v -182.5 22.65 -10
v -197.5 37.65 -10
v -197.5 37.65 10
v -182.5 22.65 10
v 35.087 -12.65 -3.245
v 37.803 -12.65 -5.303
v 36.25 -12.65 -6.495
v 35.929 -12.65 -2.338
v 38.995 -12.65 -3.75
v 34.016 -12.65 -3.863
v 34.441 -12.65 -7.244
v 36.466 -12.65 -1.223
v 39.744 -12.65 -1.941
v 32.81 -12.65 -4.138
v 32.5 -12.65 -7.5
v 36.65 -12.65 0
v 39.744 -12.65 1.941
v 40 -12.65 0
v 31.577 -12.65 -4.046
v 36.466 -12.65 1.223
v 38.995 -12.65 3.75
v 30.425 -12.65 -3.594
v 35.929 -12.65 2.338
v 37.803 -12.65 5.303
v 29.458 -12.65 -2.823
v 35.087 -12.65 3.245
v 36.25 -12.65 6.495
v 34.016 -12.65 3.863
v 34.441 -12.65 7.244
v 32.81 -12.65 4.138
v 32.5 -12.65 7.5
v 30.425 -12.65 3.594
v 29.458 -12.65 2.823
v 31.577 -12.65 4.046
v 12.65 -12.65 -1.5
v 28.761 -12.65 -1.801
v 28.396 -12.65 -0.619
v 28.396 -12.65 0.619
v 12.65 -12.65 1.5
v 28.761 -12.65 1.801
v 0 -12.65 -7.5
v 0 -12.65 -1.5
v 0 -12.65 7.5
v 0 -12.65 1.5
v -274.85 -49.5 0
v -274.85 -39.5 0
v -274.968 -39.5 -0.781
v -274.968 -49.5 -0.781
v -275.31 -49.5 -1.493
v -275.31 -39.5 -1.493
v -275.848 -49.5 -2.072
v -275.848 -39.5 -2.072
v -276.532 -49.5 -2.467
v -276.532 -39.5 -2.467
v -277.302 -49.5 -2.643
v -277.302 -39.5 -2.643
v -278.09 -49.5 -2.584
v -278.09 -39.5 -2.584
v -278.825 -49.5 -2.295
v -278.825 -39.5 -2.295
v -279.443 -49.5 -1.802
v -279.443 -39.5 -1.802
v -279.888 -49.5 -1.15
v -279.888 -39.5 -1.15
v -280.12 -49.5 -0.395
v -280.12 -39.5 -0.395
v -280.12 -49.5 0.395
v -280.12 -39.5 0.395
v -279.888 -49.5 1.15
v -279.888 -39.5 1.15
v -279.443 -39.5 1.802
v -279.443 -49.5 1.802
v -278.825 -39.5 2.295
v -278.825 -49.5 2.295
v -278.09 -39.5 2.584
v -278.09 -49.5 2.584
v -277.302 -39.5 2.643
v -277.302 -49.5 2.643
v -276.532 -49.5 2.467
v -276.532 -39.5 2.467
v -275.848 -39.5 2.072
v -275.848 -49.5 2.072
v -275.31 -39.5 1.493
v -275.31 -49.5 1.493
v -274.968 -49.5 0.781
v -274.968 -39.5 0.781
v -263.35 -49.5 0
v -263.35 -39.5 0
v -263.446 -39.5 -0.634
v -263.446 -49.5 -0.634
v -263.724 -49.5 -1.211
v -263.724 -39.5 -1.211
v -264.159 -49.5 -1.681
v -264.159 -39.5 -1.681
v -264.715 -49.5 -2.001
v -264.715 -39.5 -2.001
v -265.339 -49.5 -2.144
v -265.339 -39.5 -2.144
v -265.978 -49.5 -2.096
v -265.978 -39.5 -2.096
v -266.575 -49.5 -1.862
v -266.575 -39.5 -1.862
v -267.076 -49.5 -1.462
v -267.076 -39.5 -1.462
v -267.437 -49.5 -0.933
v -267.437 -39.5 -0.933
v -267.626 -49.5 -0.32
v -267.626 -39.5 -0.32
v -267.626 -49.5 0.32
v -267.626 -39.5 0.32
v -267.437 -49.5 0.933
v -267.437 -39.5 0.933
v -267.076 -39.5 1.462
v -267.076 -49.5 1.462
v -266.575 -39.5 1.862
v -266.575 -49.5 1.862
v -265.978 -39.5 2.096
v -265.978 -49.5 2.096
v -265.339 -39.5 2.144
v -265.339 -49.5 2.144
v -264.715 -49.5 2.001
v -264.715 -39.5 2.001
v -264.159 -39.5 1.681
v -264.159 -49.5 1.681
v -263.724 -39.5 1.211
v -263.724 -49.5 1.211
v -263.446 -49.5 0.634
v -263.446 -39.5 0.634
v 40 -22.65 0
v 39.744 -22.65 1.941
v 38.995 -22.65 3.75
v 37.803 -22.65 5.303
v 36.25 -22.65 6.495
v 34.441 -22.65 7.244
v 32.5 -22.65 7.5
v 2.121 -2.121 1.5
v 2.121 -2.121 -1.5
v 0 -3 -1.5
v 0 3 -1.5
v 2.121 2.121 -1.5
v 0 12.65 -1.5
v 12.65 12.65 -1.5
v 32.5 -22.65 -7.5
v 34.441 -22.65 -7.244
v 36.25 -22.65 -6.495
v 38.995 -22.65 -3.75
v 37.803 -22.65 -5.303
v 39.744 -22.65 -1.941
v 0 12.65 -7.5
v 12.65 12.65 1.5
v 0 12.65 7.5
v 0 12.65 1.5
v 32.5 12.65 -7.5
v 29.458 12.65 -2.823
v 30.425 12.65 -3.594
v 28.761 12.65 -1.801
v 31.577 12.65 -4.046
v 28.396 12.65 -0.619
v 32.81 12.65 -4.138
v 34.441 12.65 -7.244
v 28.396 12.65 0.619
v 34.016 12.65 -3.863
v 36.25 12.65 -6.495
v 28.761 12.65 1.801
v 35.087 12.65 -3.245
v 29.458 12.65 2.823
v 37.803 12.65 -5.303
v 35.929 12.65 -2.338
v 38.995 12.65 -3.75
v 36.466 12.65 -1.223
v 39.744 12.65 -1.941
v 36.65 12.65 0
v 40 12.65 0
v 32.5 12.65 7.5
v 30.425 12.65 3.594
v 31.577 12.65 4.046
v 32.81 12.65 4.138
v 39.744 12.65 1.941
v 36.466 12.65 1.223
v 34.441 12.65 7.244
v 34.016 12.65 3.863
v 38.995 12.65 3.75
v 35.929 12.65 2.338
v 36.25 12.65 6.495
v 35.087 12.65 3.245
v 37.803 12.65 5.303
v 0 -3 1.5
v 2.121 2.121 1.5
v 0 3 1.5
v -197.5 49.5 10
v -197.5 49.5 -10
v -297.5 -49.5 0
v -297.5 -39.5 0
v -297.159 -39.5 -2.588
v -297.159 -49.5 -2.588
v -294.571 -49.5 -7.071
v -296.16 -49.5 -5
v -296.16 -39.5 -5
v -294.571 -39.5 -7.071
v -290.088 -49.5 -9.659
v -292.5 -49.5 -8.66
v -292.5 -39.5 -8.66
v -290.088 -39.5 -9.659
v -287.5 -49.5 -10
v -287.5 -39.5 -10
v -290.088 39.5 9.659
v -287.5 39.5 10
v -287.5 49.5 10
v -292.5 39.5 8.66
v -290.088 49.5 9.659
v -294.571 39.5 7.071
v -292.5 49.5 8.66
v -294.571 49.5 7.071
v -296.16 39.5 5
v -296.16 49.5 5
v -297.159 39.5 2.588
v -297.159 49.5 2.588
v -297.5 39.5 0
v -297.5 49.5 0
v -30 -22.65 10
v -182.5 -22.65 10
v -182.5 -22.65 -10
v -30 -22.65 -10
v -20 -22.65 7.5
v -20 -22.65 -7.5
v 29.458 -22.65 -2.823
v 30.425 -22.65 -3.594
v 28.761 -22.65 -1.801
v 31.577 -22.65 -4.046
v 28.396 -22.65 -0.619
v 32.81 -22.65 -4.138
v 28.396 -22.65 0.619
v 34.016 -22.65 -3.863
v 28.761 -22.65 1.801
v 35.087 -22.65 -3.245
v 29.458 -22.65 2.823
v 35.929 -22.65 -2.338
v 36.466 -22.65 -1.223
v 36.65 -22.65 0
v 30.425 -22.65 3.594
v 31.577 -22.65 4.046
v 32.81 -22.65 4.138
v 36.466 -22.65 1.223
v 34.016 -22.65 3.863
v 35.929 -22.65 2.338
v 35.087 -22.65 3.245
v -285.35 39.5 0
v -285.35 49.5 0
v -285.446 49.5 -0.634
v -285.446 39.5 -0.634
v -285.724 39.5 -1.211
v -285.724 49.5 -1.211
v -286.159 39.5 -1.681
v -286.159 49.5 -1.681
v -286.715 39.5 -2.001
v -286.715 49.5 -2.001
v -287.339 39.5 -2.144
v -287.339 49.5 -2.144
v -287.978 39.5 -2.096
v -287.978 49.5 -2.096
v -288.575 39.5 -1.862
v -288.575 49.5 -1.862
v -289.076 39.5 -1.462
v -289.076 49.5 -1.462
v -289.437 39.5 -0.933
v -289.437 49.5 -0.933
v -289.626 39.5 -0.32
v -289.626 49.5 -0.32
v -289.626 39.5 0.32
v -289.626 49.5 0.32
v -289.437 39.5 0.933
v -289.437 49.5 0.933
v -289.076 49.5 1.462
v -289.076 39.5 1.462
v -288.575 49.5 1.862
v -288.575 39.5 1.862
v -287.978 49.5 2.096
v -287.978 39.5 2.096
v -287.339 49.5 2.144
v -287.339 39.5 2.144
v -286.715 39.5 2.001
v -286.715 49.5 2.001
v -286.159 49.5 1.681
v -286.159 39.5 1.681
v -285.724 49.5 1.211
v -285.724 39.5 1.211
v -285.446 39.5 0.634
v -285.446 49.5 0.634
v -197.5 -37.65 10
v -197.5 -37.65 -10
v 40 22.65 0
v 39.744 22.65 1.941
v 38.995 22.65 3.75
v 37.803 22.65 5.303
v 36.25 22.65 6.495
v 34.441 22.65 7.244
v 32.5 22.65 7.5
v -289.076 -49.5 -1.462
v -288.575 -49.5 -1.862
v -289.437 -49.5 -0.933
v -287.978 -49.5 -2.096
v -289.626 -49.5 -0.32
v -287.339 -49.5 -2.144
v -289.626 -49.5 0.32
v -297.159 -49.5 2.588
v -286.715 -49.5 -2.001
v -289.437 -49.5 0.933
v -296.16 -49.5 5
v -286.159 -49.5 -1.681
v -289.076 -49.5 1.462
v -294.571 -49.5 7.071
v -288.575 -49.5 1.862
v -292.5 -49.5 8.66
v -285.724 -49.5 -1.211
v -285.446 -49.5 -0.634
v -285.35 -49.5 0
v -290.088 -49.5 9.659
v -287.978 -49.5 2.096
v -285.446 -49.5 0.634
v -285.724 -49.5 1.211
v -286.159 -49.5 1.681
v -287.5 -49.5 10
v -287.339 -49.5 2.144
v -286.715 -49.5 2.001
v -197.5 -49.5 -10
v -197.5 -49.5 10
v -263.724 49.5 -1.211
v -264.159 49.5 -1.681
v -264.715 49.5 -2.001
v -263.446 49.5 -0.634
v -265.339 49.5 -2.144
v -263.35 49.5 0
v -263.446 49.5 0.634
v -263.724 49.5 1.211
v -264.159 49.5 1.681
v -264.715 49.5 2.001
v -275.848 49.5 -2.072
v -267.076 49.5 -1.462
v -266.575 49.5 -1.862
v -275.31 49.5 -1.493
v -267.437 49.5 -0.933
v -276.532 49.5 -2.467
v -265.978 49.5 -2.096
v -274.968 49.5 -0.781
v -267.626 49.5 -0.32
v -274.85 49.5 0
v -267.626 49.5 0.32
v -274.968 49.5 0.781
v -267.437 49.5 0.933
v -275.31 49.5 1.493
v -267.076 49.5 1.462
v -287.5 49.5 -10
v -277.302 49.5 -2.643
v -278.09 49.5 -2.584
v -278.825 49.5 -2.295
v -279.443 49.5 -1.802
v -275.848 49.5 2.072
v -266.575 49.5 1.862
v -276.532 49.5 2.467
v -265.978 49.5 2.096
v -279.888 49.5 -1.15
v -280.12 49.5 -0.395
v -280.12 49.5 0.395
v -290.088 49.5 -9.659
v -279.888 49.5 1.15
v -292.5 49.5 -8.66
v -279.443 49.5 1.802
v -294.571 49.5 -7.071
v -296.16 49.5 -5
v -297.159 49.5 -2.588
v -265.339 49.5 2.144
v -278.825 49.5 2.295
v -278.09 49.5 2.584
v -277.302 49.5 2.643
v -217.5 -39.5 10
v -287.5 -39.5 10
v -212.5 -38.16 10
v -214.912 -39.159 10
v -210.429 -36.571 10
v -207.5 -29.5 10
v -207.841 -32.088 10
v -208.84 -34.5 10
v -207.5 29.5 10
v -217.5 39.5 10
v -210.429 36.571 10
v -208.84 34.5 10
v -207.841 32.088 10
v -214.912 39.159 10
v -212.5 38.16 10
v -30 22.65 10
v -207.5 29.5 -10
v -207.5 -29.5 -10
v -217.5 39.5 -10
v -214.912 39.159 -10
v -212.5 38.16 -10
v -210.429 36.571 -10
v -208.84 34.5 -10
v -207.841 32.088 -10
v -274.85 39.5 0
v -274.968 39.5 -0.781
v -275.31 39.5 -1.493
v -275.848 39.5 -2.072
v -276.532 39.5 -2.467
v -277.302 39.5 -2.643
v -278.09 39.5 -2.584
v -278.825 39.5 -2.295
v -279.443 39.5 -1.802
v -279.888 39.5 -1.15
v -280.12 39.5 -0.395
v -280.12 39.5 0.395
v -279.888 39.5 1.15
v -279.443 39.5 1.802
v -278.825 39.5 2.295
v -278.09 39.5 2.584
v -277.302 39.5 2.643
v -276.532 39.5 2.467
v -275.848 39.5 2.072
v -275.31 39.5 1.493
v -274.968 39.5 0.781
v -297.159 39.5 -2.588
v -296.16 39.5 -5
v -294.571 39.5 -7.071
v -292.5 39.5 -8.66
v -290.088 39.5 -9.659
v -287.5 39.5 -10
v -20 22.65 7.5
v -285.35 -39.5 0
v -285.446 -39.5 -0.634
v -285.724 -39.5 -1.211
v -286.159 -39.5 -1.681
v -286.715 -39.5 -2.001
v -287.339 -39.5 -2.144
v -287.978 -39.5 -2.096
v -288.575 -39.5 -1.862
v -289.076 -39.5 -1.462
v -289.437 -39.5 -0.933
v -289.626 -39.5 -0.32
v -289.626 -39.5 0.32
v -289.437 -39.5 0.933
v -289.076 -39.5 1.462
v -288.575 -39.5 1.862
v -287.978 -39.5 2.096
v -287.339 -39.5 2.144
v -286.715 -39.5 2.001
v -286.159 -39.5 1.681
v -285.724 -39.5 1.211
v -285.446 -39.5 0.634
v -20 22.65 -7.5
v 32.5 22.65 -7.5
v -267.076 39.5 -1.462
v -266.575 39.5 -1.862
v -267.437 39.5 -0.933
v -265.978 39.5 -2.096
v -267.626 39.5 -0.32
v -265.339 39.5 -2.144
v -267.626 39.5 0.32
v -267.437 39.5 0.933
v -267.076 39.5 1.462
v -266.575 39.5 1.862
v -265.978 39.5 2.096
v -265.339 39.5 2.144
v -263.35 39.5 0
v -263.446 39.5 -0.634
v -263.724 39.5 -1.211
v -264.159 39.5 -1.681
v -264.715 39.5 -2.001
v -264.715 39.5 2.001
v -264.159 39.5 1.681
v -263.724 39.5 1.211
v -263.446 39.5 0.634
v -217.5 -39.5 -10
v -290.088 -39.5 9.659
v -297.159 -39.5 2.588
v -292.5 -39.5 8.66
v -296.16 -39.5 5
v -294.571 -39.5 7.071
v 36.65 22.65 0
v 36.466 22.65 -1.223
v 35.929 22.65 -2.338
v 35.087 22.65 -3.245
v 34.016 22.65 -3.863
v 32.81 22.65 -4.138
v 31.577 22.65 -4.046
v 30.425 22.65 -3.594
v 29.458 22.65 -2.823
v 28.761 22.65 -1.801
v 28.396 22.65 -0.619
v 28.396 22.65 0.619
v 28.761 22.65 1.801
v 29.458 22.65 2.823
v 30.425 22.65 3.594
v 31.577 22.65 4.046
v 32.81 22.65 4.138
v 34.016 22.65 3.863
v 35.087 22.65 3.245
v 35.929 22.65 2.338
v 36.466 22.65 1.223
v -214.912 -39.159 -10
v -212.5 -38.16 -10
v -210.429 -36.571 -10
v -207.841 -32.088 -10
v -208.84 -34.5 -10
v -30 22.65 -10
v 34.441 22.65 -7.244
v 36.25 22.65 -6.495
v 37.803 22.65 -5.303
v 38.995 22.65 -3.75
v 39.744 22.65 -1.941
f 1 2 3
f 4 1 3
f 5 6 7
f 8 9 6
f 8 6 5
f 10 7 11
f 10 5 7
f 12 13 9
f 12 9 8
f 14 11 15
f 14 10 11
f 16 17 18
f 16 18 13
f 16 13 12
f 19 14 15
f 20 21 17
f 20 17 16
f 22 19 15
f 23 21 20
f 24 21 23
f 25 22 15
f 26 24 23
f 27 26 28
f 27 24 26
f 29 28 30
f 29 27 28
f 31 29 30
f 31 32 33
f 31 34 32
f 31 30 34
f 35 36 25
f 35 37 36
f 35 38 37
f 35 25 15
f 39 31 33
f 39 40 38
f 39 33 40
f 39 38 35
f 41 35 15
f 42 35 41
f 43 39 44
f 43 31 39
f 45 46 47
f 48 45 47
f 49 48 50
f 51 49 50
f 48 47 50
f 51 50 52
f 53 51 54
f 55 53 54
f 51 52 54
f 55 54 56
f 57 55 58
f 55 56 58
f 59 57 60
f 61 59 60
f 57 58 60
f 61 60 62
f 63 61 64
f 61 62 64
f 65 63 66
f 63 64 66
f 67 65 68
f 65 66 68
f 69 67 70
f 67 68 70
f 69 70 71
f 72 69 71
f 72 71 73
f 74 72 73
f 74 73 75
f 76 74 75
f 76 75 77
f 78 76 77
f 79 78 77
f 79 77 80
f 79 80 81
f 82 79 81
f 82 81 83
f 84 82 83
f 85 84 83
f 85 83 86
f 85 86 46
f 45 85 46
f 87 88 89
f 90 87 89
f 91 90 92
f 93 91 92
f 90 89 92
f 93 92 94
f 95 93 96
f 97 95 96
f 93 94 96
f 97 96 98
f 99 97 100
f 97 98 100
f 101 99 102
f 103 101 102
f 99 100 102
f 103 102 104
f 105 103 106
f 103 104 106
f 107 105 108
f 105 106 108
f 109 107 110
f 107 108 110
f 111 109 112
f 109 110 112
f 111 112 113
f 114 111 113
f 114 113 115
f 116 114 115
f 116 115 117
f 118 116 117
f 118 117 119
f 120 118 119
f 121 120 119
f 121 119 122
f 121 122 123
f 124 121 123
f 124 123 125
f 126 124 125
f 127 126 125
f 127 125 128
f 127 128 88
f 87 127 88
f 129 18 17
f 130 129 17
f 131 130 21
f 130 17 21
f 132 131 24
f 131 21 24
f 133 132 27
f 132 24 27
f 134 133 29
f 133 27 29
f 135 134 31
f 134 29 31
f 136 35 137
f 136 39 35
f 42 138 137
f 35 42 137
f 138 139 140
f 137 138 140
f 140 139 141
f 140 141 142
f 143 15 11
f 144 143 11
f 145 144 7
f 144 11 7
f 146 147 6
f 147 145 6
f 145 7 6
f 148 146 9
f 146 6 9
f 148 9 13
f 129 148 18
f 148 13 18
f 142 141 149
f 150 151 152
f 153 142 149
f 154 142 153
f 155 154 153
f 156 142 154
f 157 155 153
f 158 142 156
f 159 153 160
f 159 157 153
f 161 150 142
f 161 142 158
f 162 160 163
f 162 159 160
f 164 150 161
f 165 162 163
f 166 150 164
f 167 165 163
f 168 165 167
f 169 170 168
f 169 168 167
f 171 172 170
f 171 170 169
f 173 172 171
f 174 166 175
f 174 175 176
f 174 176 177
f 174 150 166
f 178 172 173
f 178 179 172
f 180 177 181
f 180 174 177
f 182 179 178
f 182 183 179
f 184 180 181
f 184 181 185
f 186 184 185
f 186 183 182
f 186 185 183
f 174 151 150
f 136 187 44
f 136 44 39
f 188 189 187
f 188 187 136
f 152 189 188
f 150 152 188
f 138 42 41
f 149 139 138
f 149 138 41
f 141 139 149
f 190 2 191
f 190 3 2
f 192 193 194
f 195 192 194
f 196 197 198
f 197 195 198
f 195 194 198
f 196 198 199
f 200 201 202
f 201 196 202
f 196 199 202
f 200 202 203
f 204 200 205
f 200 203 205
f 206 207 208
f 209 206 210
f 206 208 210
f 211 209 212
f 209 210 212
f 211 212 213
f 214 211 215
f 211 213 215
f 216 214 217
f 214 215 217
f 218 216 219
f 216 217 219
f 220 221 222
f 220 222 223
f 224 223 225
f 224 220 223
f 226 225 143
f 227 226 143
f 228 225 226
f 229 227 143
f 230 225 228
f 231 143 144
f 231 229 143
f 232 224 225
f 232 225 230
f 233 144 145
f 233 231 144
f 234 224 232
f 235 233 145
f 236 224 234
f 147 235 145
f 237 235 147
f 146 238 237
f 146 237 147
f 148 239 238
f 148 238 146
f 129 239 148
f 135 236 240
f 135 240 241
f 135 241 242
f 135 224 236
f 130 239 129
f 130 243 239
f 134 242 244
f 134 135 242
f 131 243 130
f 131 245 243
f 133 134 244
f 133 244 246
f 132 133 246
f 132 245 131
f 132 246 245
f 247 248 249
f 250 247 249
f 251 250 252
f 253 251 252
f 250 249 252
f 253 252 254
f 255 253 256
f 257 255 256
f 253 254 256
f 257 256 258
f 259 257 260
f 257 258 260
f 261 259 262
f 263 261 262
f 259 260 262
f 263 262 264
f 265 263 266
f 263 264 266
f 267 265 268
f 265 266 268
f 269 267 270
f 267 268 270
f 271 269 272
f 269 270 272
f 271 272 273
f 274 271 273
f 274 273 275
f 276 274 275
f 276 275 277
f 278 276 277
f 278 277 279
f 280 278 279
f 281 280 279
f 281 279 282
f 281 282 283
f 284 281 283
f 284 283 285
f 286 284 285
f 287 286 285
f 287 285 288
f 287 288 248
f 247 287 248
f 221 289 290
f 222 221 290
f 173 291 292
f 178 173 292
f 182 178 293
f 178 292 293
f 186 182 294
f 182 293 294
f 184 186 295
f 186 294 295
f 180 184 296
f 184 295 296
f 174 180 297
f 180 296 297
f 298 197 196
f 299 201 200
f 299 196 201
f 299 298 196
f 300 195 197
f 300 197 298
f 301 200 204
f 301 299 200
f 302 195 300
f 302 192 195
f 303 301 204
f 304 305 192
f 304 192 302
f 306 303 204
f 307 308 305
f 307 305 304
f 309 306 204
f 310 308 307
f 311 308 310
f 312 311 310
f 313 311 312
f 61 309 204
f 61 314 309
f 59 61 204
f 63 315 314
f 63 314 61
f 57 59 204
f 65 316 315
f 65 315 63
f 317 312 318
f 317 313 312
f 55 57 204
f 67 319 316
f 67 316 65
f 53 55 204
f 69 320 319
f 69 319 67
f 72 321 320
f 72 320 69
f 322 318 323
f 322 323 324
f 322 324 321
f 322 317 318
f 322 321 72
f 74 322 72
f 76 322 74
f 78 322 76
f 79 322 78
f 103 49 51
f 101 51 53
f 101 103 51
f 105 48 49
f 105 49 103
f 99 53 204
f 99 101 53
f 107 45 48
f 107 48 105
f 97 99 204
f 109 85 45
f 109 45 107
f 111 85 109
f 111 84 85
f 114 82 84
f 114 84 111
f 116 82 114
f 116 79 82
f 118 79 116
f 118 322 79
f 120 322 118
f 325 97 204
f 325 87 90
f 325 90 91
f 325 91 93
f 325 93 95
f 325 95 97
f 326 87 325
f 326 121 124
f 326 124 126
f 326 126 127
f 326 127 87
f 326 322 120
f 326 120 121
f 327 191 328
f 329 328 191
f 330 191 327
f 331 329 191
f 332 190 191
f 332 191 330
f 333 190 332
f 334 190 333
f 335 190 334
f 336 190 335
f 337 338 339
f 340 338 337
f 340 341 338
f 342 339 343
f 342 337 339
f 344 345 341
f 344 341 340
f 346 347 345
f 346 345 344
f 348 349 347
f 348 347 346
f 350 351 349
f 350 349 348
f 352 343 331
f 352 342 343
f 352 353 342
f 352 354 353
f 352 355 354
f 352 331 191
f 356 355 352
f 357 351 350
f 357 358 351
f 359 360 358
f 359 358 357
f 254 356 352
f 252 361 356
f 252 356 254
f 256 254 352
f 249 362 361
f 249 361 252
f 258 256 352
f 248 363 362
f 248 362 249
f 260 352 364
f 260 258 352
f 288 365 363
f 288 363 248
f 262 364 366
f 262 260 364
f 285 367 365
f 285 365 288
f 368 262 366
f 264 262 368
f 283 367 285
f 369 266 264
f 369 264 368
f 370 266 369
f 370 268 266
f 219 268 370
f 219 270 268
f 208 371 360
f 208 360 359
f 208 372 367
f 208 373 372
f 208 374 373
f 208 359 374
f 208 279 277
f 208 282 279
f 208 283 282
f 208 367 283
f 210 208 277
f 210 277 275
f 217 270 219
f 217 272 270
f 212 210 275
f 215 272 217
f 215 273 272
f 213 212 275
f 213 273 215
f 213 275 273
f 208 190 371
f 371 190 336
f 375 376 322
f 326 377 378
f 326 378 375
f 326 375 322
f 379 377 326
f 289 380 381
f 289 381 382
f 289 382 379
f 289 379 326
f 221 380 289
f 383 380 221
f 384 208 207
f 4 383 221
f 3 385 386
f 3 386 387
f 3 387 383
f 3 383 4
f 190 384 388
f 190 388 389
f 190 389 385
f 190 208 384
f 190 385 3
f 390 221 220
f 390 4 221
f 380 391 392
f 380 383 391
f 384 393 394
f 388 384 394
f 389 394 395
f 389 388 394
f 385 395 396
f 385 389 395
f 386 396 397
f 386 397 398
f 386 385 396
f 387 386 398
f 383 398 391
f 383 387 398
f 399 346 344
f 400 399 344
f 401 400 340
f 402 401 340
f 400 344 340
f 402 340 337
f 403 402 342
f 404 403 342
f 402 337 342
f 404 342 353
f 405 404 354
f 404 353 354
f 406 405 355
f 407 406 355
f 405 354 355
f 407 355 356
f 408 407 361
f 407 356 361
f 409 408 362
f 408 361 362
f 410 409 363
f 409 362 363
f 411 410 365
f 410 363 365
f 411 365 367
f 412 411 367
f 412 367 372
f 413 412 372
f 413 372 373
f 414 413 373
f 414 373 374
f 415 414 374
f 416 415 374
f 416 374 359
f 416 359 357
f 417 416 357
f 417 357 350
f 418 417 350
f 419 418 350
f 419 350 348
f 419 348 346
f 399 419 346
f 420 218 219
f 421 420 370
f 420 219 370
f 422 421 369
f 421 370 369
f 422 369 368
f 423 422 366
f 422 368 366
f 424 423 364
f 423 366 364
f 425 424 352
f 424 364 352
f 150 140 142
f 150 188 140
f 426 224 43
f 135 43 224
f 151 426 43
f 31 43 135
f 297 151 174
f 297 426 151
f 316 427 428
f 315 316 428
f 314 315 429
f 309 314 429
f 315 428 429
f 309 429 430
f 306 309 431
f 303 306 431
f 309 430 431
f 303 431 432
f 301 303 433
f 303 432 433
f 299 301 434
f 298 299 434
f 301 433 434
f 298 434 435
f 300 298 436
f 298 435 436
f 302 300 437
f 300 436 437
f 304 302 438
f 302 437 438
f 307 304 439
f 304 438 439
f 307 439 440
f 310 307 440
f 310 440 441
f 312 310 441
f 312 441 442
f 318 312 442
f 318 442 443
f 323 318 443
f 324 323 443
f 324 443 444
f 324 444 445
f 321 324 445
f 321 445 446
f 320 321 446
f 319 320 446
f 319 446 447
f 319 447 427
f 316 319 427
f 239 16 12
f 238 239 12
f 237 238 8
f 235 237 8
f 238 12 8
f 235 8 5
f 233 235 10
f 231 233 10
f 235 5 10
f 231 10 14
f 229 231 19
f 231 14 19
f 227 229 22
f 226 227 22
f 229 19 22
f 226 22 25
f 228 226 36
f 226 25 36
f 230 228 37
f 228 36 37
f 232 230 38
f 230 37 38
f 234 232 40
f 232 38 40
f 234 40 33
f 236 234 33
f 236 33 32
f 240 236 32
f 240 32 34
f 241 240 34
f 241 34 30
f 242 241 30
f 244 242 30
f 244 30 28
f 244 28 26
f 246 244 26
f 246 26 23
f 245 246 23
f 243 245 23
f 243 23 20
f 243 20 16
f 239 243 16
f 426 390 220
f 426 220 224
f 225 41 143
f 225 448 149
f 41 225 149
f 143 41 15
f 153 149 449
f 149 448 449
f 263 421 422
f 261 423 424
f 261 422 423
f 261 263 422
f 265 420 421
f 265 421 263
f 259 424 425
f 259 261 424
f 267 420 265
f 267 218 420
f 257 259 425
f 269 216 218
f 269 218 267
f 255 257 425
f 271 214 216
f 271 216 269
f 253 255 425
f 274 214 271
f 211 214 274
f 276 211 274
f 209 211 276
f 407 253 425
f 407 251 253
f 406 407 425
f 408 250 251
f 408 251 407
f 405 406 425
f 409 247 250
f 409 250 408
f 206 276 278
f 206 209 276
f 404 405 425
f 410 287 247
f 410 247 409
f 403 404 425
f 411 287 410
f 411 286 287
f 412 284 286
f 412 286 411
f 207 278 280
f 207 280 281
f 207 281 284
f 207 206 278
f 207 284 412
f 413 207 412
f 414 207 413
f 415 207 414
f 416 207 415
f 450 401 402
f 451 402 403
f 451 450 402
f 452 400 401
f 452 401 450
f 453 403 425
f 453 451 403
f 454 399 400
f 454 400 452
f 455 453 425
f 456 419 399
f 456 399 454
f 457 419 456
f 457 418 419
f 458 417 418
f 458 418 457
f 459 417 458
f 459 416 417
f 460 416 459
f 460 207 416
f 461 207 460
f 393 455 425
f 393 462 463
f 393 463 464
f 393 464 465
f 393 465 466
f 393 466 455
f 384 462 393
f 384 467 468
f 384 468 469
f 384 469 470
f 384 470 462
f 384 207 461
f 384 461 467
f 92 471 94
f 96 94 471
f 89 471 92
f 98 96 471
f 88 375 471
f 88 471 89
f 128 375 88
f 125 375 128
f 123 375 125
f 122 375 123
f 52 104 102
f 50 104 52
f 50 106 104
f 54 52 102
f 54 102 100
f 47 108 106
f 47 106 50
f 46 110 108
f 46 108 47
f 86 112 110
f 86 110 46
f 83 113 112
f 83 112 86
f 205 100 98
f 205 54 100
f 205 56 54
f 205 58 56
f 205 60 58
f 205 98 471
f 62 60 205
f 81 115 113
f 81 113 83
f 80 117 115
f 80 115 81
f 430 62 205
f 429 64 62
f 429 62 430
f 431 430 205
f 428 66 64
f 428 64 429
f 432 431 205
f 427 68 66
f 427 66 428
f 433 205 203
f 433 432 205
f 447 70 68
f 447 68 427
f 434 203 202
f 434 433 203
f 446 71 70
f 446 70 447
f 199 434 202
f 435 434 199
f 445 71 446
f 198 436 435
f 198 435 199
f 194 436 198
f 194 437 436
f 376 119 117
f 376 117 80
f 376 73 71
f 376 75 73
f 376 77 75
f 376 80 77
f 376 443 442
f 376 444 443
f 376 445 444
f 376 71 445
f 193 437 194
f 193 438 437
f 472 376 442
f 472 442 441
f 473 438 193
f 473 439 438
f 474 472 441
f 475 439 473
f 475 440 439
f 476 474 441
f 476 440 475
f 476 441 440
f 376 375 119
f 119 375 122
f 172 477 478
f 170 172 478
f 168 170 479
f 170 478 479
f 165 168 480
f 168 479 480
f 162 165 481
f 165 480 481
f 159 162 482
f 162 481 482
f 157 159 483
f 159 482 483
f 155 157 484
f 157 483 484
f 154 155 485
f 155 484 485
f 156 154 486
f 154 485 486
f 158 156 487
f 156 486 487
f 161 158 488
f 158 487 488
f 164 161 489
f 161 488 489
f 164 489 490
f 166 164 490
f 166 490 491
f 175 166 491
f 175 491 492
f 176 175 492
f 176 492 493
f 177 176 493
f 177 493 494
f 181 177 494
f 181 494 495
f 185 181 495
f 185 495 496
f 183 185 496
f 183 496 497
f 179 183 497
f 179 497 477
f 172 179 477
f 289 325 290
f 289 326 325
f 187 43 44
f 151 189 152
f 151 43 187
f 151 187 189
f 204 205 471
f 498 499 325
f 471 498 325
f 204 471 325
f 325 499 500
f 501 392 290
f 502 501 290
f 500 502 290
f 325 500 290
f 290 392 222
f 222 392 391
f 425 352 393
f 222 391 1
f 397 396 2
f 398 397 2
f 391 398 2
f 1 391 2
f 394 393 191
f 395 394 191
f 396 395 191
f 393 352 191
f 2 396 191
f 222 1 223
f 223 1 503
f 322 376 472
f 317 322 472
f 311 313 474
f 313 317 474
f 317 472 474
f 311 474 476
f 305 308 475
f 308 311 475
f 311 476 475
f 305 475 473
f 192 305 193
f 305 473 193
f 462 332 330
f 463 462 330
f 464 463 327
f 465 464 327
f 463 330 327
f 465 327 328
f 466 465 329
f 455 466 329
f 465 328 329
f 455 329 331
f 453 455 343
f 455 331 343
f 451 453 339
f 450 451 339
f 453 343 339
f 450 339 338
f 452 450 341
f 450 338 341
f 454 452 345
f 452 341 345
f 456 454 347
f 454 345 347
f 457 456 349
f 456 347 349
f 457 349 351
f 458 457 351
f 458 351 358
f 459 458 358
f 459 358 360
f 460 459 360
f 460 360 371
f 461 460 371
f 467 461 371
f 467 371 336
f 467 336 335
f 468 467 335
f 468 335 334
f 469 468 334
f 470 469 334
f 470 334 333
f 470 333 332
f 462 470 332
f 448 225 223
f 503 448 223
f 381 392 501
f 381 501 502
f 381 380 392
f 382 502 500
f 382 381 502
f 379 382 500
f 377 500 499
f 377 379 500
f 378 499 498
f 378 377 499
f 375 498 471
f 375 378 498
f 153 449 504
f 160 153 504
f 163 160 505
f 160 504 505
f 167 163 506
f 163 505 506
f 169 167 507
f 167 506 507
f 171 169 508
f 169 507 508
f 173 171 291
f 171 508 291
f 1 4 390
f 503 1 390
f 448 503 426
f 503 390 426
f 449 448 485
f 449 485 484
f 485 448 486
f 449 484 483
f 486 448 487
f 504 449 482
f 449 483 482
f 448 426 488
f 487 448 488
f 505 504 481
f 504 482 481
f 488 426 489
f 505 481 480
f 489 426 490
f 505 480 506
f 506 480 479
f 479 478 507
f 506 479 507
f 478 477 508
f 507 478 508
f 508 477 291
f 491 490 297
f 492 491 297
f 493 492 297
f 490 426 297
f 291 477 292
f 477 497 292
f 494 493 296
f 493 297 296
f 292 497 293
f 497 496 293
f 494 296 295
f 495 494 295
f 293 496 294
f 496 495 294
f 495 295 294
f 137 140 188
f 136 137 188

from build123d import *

# Parameters (mm, degrees)
SKETCH_2_W          = 187.5
SKETCH_2_H          = 45.3
EXTRUDE_1_DEPTH     = 10
EXTRUDE_2_DEPTH     = 7.5
CHAMFER_1_SIZE      = 20
CHAMFER_1_SIZE_2    = 5
CHAMFER_2_SIZE      = 5
CHAMFER_2_SIZE_2    = 20
EXTRUDE_3_DEPTH     = 1.5
CHAMFER_3_SIZE      = 3
CUT_EXTRUDE_1_DEPTH = 314.699298692
CUT_EXTRUDE_2_DEPTH = 307.287238552
CHAMFER_4_SIZE      = 15
FILLET_1_R          = 10


with BuildPart() as part:
    # 草图2 → 凸台-拉伸1 (new, symmetric)
    with BuildSketch(Plane.XY):
        with Locations((-103.75, 0)):
            Rectangle(SKETCH_2_W, SKETCH_2_H)
        Polygon((-297.5, 49.5), (-297.5, 39.5), (-207.5, 39.5), (-207.5, -39.5), (-297.5, -39.5), (-297.5, -49.5), (-197.5, -49.5), (-197.5, 49.5), align=None)
    extrude(amount=EXTRUDE_1_DEPTH, both=True)

    # 草图2<3> → 凸台-拉伸2 (add, symmetric)
    with BuildSketch(Plane.XY):
        Polygon((40, -22.65), (40, -12.65), (0, -12.65), (0, 12.65), (40, 12.65), (40, 22.65), (-10, 22.65), (-10, -22.65), align=None)
    extrude(amount=EXTRUDE_2_DEPTH, both=True)

    # 倒角1
    # the kernel refuses this chamfer: 20, 5 mm, written as the material it takes off along each edge
    with BuildSketch(Plane(origin=(-10, -74.592549995, 10), x_dir=(-0.9999563942249224, 0, 0.00933861064031752), z_dir=(0, 1, 0))) as chamfer_1_piece_1_section:
        Polygon((CHAMFER_1_SIZE * 0.999956394225, -CHAMFER_1_SIZE * 0.00933861064032), (-CHAMFER_1_SIZE_2 * 0.00933861064032, -CHAMFER_1_SIZE_2 * 0.999956394225), (0, 0), align=None)
    chamfer_1_piece_1 = extrude(amount=149.185099991, mode=Mode.PRIVATE)
    chamfer_1_piece_1 = split(chamfer_1_piece_1, bisect_by=Plane(origin=(-18.245866107, 0, 7.5), z_dir=(0, 0, 1)), keep=Keep.TOP, mode=Mode.PRIVATE)
    add(chamfer_1_piece_1, mode=Mode.SUBTRACT)

    # 倒角2
    # the kernel refuses this chamfer: 20, 5 mm, written as the material it takes off along each edge
    with BuildSketch(Plane(origin=(-10, -74.592549995, -10), x_dir=(0.14778356633657133, 0, 0.9890197255468893), z_dir=(0, 1, 0))) as chamfer_2_piece_1_section:
        Polygon((CHAMFER_2_SIZE * 0.989019725547, -CHAMFER_2_SIZE * 0.147783566337), (-CHAMFER_2_SIZE_2 * 0.147783566337, -CHAMFER_2_SIZE_2 * 0.989019725547), (0, 0), align=None)
    chamfer_2_piece_1 = extrude(amount=149.185099991, mode=Mode.PRIVATE)
    chamfer_2_piece_1 = split(chamfer_2_piece_1, bisect_by=Plane(origin=(-18.245866107, 0, -7.5), z_dir=(0, 0, -1)), keep=Keep.TOP, mode=Mode.PRIVATE)
    add(chamfer_2_piece_1, mode=Mode.SUBTRACT)

    # 草图2<5> → 凸台-拉伸3 (add, symmetric)
    with BuildSketch(Plane.XY):
        Polygon((12.65, 12.65), (0, 12.65), (0, 0), align=None)
        Polygon((12.65, -12.65), (0, 0), (0, -12.65), align=None)
    extrude(amount=EXTRUDE_3_DEPTH, both=True)

    # 倒角3
    chamfer_3_edges = [part.edges().sort_by_distance(p)[0] for p in [
        (0, 0, 0),
    ]]
    chamfer(chamfer_3_edges, length=CHAMFER_3_SIZE)

    # 草图3 → 切除-拉伸1 (cut, through all)
    with BuildSketch(Plane(origin=(0, 49.5, 0), x_dir=(1, 0, 0), z_dir=(0, 1, 0))):
        with BuildLine():
            ThreePointArc((-297.5, 0), (-294.571067812, 7.071067812), (-287.5, 10))
            Line((-287.5, 10), (-297.5, 10))
            Line((-297.5, 10), (-297.5, 0))
        make_face()
        with BuildLine():
            Line((-297.5, -10), (-287.5, -10))
            ThreePointArc((-287.5, -10), (-294.571067812, -7.071067812), (-297.5, 0))
            Line((-297.5, 0), (-297.5, -10))
        make_face()
        with BuildLine():
            ThreePointArc((-289.65, 0), (-287.5, -2.15), (-285.35, 0))
            Line((-285.35, 0), (-289.65, 0))
        make_face()
        with BuildLine():
            Line((-289.65, 0), (-285.35, 0))
            ThreePointArc((-285.35, 0), (-287.5, 2.15), (-289.65, 0))
        make_face()
        with BuildLine():
            ThreePointArc((-280.15, 0), (-277.5, -2.65), (-274.85, 0))
            Line((-274.85, 0), (-280.15, 0))
        make_face()
        with BuildLine():
            Line((-280.15, 0), (-274.85, 0))
            ThreePointArc((-274.85, 0), (-277.5, 2.65), (-280.15, 0))
        make_face()
        with BuildLine():
            ThreePointArc((-267.65, 0), (-265.5, -2.15), (-263.35, 0))
            Line((-263.35, 0), (-267.65, 0))
        make_face()
        with BuildLine():
            Line((-267.65, 0), (-263.35, 0))
            ThreePointArc((-263.35, 0), (-265.5, 2.15), (-267.65, 0))
        make_face()
    extrude(amount=-CUT_EXTRUDE_1_DEPTH, mode=Mode.SUBTRACT)

    # 草图4 → 切除-拉伸2 (cut, through all)
    with BuildSketch(Plane(origin=(0, 22.65, 0), x_dir=(1, 0, 0), z_dir=(0, 1, 0))):
        with BuildLine():
            ThreePointArc((28.35, 0), (32.5, -4.15), (36.65, 0))
            Line((36.65, 0), (28.35, 0))
        make_face()
        with BuildLine():
            Line((28.35, 0), (36.65, 0))
            ThreePointArc((36.65, 0), (32.5, 4.15), (28.35, 0))
        make_face()
        with BuildLine():
            ThreePointArc((32.5, 7.5), (37.803300859, 5.303300859), (40, 0))
            Line((40, 0), (40, 7.5))
            Line((40, 7.5), (32.5, 7.5))
        make_face()
        with BuildLine():
            Line((40, -7.5), (40, 0))
            ThreePointArc((40, 0), (37.80330088, -5.303300838), (32.500000061, -7.5))
            Line((32.500000061, -7.5), (40, -7.5))
        make_face()
    extrude(amount=-CUT_EXTRUDE_2_DEPTH, mode=Mode.SUBTRACT)

    # 倒角4
    chamfer_4_edges = [part.edges().sort_by_distance(p)[0] for p in [
        (-197.5, -22.65, 0),
        (-197.5, 22.65, 0),
    ]]
    chamfer(chamfer_4_edges, length=CHAMFER_4_SIZE)

    # 圆角1
    fillet_1_edges = [part.edges().sort_by_distance(p)[0] for p in [
        (-207.5, -39.5, 0),
        (-207.5, 39.5, 0),
    ]]
    fillet(fillet_1_edges, radius=FILLET_1_R)


solid = part.part
